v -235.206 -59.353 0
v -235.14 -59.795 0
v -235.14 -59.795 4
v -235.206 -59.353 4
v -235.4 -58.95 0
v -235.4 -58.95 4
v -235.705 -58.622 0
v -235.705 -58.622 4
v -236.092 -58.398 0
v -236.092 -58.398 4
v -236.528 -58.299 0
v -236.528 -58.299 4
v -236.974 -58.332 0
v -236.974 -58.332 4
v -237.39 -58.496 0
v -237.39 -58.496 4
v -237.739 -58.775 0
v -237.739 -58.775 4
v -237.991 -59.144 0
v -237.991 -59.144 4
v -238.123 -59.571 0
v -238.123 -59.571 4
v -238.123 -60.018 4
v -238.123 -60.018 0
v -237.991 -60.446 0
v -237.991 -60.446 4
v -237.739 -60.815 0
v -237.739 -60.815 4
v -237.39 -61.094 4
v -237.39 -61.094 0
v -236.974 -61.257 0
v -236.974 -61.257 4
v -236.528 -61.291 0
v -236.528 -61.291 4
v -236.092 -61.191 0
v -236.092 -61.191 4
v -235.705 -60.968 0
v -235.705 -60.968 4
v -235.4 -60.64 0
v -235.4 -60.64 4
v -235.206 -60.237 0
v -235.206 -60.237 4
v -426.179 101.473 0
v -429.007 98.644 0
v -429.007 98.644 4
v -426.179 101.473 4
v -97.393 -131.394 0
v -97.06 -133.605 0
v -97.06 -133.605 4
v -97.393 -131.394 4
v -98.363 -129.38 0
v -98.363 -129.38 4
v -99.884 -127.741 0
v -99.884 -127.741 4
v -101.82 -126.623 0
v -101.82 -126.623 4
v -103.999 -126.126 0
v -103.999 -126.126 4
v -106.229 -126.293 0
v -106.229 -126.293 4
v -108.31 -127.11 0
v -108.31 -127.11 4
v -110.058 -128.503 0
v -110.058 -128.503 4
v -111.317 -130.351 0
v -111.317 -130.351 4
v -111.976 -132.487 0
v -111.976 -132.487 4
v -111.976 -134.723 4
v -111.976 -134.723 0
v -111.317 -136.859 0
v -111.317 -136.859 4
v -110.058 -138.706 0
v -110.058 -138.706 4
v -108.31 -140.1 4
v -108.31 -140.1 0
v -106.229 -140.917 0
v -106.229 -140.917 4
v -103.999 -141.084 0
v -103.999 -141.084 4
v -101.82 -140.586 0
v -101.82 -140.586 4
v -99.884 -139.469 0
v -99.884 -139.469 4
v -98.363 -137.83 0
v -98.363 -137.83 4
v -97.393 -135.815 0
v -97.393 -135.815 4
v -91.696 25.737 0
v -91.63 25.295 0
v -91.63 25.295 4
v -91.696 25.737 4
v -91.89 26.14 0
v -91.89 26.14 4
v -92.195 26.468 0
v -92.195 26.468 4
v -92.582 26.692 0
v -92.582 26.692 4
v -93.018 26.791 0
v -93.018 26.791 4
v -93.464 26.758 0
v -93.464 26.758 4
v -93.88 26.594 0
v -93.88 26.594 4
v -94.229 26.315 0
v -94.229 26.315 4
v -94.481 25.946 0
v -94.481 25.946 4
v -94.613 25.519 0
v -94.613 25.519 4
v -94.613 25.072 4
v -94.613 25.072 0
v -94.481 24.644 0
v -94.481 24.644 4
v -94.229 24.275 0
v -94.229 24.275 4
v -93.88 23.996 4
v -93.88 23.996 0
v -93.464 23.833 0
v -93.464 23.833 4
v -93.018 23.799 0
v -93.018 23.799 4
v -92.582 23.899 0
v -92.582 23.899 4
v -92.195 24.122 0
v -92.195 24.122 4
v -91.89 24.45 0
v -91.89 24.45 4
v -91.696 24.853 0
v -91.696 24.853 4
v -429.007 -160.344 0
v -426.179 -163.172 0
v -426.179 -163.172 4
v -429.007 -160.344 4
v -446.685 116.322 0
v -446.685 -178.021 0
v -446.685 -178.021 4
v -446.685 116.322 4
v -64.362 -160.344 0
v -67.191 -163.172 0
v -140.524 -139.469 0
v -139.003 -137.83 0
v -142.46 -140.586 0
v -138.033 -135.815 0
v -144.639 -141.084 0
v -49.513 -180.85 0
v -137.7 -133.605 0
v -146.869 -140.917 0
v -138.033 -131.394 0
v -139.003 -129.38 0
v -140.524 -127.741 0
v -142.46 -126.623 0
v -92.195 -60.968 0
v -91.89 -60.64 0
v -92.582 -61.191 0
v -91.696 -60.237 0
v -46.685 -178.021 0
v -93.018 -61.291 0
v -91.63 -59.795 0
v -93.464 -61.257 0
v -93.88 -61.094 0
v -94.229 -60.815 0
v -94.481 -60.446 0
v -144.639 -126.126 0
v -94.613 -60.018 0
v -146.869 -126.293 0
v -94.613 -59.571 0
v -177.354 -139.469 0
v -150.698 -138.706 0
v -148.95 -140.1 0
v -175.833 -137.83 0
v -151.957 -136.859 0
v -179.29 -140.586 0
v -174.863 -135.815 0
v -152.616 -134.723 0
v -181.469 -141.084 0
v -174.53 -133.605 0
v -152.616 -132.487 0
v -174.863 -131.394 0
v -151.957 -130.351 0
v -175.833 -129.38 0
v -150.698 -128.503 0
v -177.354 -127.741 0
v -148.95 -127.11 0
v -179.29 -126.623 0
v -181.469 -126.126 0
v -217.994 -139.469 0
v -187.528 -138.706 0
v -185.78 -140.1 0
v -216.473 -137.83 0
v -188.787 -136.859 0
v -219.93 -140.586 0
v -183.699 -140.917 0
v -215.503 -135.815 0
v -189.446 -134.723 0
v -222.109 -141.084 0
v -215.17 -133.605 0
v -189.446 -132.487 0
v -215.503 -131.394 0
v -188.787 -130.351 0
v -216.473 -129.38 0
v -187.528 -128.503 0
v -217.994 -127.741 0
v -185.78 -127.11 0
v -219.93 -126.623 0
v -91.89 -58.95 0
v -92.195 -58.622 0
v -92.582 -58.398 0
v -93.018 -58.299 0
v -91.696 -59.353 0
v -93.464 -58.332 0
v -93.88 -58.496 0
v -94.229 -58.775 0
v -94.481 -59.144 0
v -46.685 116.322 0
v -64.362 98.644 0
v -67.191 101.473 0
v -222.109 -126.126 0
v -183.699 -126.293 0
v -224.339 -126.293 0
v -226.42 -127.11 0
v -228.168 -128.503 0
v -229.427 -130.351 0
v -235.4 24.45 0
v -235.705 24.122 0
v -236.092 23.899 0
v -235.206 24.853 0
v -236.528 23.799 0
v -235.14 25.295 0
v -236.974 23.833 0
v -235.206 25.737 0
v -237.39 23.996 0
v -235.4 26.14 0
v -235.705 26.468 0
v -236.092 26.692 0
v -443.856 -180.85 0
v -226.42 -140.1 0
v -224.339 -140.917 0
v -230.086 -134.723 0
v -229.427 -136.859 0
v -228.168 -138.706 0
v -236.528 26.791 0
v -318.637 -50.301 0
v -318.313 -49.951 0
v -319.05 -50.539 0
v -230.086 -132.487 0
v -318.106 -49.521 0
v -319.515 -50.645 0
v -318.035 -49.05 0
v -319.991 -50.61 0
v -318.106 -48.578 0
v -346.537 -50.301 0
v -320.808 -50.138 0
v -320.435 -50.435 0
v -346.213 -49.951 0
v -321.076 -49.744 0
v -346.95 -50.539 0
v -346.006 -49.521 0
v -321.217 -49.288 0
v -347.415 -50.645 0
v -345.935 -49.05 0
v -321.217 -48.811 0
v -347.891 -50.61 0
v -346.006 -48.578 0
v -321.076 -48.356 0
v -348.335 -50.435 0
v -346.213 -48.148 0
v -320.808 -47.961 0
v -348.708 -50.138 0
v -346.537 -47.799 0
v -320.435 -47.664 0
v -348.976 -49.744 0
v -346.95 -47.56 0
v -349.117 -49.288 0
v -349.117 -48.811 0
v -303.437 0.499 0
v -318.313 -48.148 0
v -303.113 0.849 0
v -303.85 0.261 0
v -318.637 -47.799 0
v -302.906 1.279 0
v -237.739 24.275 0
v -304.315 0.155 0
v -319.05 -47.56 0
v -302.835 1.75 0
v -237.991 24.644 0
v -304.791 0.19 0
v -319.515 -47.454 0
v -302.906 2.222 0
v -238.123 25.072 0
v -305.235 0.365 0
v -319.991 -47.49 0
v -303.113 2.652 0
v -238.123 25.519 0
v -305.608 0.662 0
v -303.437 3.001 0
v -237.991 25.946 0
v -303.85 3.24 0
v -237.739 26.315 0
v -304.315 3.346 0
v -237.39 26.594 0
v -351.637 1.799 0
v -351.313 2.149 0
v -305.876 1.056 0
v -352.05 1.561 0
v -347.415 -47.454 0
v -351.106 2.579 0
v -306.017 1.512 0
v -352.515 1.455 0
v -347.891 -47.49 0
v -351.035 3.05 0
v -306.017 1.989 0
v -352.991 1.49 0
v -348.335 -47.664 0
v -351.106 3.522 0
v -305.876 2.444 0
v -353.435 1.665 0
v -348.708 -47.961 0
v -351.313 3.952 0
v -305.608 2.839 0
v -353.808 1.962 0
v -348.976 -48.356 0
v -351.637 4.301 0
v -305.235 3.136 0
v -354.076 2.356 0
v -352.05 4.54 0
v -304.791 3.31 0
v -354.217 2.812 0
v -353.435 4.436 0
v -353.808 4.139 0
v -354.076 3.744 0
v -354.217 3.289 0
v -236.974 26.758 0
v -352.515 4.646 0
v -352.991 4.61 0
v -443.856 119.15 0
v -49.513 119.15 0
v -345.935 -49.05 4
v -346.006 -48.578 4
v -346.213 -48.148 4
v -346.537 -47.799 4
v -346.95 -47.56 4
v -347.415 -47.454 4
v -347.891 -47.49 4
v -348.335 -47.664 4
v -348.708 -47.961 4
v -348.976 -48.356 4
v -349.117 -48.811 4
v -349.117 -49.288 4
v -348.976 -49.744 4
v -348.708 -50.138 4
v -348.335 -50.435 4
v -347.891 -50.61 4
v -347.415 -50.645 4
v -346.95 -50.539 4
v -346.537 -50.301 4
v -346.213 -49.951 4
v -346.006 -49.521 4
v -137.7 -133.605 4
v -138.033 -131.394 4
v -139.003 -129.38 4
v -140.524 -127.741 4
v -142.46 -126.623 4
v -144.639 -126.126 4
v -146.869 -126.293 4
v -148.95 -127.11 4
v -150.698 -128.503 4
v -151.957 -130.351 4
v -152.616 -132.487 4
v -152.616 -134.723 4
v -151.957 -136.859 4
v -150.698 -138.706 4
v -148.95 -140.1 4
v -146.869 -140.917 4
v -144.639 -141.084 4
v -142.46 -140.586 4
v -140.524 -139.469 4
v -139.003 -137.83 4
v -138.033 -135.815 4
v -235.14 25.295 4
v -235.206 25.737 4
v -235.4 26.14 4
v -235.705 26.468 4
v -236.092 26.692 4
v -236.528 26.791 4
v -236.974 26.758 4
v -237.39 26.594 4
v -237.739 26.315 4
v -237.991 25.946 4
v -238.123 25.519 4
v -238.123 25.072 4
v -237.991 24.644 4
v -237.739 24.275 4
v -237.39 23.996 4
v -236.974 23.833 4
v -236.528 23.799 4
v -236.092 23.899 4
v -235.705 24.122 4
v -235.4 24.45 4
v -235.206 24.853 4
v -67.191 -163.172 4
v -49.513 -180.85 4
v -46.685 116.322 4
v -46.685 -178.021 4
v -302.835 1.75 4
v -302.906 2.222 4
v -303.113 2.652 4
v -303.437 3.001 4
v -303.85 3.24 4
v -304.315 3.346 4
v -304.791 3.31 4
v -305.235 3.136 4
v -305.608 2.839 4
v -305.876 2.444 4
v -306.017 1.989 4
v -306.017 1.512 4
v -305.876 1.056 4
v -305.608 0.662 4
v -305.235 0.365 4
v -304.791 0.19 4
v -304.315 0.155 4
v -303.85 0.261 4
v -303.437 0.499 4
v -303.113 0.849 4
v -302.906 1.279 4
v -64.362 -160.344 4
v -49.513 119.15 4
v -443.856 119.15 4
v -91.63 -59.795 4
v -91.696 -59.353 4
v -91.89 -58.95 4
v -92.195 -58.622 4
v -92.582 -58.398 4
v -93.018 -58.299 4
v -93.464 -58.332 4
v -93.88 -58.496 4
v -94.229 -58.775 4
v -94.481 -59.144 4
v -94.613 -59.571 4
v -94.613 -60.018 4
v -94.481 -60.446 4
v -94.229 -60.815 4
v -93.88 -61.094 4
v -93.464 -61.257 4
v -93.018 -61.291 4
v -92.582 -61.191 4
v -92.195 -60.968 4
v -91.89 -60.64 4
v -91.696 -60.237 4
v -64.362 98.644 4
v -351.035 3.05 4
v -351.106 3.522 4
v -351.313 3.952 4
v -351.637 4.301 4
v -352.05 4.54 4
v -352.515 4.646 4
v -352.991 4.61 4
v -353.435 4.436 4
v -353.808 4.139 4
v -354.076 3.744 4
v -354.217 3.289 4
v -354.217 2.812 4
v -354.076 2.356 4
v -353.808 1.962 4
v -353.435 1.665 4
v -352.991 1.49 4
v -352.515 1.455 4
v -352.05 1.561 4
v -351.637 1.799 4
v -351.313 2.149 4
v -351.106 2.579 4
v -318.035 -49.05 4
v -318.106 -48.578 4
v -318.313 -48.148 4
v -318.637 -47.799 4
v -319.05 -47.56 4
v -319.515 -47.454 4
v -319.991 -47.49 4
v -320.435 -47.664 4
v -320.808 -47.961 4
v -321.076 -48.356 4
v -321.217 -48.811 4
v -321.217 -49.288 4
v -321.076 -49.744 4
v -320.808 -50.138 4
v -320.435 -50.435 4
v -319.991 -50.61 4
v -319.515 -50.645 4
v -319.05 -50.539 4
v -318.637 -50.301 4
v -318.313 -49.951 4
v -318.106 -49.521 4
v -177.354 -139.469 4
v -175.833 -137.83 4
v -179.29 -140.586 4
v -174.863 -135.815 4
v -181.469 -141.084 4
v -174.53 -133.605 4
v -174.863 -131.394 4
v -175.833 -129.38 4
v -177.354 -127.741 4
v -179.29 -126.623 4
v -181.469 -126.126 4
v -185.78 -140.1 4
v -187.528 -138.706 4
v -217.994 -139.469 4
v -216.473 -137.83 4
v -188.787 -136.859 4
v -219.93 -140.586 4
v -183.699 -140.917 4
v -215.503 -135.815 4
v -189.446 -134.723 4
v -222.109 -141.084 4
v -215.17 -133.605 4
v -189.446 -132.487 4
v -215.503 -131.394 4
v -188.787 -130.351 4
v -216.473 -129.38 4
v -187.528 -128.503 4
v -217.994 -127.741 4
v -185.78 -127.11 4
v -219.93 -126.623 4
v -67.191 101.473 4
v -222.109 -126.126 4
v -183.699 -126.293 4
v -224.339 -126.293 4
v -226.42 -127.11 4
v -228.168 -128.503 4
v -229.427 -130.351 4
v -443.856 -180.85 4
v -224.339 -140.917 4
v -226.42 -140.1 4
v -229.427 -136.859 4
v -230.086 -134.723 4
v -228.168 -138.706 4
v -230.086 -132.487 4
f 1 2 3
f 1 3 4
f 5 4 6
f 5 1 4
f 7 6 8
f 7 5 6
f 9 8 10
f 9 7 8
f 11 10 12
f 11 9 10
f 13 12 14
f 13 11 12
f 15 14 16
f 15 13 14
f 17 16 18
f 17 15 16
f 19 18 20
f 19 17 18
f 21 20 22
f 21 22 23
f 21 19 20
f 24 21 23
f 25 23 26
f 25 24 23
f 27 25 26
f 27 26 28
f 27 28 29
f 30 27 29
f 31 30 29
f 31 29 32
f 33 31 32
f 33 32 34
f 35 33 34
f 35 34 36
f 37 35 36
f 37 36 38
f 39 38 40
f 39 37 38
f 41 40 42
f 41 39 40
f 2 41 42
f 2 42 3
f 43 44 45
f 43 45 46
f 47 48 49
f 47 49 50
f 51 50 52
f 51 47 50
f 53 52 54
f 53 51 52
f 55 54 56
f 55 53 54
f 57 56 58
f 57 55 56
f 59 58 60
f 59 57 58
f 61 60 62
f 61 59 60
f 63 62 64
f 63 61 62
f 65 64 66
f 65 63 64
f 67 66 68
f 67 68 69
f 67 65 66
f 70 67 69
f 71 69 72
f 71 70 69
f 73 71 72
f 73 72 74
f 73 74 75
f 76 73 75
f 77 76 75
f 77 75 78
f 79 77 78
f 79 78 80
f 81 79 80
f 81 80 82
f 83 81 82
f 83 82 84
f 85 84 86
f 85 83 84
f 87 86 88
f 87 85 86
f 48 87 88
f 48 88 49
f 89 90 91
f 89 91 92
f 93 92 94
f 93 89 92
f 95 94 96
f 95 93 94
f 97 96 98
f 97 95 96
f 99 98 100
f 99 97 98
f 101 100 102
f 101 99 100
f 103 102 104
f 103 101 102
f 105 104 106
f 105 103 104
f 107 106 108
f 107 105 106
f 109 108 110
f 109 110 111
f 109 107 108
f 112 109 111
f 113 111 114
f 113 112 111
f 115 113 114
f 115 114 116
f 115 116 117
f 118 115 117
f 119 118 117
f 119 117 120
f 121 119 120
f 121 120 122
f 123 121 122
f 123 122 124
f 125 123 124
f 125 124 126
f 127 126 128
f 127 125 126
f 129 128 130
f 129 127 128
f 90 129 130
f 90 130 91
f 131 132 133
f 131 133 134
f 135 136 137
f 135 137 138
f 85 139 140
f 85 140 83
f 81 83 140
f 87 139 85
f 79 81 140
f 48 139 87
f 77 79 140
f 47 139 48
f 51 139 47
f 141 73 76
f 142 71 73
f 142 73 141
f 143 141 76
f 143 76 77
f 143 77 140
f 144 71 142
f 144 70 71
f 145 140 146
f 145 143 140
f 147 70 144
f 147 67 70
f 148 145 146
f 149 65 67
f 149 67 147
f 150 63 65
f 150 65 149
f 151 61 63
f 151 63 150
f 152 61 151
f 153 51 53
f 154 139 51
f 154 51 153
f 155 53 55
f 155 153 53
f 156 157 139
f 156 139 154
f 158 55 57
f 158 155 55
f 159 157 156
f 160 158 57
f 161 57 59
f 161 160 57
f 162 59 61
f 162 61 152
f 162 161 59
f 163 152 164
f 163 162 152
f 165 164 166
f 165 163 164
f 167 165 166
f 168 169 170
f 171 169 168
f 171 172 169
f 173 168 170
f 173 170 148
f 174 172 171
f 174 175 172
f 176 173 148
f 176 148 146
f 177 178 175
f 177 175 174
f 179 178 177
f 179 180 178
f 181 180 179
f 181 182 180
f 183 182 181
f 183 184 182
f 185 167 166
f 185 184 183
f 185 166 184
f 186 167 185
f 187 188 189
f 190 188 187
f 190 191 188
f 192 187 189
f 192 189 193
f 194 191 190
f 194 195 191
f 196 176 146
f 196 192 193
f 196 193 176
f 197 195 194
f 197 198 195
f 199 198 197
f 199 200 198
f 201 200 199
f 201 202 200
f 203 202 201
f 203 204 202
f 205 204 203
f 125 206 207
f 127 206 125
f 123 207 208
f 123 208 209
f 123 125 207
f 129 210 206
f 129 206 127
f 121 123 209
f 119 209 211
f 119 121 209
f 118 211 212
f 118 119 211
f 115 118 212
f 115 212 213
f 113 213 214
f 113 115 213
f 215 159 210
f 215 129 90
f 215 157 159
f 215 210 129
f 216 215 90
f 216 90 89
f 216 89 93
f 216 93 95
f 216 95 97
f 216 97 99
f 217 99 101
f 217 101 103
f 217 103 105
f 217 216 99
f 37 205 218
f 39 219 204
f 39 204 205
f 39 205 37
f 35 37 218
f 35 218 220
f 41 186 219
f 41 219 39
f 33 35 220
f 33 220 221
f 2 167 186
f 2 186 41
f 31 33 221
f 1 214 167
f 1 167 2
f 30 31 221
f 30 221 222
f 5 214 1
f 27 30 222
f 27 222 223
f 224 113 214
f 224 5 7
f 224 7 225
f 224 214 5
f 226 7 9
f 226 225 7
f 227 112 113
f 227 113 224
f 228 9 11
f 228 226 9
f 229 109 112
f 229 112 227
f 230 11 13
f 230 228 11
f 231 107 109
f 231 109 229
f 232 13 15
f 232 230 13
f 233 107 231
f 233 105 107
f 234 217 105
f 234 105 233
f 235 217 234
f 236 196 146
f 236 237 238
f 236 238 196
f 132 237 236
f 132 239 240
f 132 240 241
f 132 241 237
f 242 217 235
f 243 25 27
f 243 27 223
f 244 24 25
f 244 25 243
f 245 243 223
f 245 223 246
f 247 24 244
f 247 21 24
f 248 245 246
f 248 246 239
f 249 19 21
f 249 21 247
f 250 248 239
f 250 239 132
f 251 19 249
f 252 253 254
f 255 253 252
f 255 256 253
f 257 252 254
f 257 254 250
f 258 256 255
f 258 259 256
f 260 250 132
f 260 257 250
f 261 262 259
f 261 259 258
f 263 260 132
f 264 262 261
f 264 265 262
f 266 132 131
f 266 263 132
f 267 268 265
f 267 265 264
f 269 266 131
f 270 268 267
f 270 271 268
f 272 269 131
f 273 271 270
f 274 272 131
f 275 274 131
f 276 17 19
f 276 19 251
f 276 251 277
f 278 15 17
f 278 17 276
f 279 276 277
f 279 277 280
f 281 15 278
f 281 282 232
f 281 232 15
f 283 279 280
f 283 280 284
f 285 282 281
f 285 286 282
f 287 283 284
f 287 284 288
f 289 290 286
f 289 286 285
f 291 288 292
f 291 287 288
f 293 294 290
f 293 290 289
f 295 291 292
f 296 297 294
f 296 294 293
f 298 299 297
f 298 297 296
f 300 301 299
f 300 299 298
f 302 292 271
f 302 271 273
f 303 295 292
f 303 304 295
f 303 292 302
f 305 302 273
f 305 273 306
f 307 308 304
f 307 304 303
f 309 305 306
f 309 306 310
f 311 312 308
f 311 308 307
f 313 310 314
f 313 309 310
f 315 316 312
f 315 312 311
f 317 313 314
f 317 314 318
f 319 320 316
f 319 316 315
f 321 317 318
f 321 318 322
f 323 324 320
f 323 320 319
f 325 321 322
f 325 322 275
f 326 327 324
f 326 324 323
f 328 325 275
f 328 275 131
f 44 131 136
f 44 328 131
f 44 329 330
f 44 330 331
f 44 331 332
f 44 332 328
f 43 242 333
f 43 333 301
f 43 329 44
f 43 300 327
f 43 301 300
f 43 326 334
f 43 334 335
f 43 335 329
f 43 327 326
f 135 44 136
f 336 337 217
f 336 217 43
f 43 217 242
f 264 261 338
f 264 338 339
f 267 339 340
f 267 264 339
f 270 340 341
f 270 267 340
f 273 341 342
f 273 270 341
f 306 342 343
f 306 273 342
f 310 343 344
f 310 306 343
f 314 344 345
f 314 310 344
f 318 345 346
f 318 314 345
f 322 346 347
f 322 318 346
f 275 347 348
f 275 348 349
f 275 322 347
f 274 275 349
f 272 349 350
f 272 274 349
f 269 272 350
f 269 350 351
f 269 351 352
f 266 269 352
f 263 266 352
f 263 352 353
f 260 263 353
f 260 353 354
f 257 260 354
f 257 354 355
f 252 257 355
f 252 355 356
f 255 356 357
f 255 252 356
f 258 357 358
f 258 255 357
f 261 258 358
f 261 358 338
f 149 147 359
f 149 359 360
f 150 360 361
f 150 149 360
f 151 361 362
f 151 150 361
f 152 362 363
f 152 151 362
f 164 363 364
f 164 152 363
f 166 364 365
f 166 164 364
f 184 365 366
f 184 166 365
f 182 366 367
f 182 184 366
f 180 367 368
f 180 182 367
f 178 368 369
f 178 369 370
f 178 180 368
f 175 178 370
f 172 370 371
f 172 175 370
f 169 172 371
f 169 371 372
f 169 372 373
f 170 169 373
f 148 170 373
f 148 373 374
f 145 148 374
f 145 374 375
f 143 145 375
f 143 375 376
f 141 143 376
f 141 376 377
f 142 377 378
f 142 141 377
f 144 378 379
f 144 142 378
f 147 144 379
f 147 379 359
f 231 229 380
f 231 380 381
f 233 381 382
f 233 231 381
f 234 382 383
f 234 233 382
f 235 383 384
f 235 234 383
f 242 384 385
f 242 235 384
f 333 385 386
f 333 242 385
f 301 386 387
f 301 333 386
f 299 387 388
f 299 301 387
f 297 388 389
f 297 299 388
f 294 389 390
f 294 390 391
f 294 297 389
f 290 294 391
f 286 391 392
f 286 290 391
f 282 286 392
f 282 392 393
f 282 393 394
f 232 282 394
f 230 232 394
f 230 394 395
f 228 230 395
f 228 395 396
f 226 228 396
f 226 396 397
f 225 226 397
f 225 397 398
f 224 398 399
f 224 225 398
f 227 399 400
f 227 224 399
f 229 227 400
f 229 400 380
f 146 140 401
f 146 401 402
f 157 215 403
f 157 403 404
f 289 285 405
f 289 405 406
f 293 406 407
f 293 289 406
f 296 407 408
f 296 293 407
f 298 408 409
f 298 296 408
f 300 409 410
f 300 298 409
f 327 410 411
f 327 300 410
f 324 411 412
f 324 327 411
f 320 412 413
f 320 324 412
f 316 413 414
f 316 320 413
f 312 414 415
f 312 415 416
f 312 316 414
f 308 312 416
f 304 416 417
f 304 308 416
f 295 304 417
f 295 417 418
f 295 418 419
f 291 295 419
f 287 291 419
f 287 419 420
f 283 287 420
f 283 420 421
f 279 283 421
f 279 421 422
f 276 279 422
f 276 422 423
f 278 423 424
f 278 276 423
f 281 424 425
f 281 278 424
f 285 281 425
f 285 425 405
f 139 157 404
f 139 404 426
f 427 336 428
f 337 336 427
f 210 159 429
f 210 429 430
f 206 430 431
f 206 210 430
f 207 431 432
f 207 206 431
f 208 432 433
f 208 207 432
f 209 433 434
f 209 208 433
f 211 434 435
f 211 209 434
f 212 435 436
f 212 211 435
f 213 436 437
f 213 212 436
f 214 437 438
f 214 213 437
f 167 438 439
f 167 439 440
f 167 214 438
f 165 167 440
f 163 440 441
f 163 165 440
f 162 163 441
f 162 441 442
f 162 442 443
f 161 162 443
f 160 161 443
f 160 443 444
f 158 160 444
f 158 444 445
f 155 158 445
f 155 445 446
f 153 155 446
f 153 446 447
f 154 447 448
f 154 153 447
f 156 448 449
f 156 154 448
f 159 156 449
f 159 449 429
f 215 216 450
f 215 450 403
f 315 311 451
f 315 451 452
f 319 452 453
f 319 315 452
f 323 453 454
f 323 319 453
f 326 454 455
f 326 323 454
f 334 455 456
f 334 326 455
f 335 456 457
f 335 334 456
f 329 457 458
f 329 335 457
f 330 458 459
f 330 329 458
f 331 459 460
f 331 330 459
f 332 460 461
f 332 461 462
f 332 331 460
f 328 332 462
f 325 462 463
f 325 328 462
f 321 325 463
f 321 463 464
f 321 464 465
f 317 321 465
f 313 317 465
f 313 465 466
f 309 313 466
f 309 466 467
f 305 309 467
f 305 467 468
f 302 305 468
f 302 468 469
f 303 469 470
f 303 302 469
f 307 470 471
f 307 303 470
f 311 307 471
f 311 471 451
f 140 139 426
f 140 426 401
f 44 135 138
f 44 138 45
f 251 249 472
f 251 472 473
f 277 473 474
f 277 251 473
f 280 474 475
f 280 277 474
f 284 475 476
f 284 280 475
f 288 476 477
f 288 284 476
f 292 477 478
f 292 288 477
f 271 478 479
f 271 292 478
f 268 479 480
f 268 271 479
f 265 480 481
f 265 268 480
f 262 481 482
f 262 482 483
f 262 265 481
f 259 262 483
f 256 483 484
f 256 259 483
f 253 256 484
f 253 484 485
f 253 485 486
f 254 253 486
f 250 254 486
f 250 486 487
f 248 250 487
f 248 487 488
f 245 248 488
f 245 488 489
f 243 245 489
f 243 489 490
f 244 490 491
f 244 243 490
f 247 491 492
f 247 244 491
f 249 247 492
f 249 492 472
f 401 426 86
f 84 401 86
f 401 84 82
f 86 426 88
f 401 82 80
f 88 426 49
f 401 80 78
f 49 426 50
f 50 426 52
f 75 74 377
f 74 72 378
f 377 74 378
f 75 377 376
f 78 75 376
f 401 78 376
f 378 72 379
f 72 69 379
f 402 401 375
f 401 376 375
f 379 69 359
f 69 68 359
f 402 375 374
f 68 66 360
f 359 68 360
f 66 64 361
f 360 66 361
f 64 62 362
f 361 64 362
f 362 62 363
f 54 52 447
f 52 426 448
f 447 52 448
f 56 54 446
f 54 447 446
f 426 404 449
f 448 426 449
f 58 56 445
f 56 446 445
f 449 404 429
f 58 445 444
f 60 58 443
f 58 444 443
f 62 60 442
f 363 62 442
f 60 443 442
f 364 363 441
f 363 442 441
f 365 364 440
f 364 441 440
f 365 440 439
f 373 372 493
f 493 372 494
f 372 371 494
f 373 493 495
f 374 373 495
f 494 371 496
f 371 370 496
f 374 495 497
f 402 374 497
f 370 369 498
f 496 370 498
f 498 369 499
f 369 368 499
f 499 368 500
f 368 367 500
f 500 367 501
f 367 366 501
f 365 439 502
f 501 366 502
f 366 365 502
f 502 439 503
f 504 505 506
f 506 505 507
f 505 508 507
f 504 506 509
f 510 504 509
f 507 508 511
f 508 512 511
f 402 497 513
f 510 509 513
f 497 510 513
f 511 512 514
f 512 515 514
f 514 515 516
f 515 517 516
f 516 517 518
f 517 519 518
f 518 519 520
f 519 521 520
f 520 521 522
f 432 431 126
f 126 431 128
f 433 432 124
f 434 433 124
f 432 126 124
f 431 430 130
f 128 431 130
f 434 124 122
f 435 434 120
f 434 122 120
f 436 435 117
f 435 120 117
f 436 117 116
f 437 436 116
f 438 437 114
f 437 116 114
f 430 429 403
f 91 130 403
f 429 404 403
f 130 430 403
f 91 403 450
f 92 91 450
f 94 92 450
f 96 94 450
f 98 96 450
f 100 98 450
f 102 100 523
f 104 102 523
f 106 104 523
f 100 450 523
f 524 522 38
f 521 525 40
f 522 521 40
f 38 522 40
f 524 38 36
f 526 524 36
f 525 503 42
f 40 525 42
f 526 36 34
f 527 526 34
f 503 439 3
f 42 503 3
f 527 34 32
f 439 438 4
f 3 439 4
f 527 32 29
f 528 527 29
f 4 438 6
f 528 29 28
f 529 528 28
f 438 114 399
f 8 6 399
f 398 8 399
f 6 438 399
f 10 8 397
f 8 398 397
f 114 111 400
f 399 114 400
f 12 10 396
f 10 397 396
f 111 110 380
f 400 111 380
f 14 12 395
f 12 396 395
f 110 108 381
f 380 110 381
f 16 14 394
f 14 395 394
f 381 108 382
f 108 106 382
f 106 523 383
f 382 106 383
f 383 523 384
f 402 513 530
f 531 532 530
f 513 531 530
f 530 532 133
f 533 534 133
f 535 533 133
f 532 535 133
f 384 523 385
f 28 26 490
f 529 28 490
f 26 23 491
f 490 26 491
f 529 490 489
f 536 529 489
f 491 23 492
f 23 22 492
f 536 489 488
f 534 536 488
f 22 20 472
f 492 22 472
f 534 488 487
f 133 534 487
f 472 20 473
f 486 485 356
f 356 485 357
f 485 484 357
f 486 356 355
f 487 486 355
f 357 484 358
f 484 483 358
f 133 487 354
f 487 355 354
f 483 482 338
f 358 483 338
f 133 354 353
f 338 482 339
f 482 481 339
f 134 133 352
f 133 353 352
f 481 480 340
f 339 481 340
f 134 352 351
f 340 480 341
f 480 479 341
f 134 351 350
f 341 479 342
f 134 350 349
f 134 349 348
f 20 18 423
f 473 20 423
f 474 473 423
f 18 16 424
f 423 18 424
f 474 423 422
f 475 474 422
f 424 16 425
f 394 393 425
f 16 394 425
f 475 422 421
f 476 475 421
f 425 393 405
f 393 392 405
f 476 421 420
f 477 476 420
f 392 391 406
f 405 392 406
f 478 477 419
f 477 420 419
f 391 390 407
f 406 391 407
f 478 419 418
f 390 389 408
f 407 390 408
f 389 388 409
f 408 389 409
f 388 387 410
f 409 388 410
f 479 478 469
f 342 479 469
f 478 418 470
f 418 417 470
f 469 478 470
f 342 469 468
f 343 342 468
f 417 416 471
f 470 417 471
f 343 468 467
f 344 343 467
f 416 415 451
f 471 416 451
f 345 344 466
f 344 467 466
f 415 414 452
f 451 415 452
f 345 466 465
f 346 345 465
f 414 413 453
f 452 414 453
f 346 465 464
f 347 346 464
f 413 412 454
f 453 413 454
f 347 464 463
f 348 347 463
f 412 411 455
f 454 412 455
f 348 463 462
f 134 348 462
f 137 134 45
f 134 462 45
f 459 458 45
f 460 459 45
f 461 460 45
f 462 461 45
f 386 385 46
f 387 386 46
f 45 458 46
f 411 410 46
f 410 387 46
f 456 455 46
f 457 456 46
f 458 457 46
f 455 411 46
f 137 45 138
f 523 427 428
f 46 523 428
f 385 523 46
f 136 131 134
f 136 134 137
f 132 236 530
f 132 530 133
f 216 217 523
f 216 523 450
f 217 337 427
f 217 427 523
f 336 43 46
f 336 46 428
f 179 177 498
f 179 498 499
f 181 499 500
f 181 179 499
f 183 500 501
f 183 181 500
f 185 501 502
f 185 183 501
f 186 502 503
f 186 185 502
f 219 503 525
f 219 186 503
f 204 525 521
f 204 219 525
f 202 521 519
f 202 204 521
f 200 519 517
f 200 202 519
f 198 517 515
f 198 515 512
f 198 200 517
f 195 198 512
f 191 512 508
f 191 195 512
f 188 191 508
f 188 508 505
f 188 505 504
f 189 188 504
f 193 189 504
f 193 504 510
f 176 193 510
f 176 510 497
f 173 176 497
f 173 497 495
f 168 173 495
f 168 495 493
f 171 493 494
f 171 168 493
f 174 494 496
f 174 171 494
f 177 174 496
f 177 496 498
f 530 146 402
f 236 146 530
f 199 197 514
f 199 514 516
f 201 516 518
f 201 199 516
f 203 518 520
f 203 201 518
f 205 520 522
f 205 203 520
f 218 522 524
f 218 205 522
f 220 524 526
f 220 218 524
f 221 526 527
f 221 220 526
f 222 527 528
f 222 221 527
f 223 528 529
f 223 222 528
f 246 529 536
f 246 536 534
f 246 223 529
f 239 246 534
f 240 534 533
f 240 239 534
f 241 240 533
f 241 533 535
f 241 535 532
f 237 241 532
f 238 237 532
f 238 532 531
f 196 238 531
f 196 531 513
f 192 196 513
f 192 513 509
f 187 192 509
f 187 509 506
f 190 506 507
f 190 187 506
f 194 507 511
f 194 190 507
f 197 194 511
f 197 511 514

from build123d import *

# Parameters (mm, degrees)
ESQUISSE1_R        = 1.5
ESQUISSE1_R_2      = 7.5
ESQUISSE1_R_3      = 1.6
BOSS_EXTRU_1_DEPTH = 4


with BuildPart() as part:
    # Esquisse1 → Boss.-Extru.1 (new body)
    with BuildSketch(Plane.XY):
        Polygon((-443.856361675, 119.15022686), (-49.513215925, 119.15022686), (-67.190885454, 101.472557331), (-64.36245833, 98.644130206), (-46.6847888, 116.321799736), (-46.6847888, -178.021346015), (-64.36245833, -160.343676485), (-67.190885454, -163.17210361), (-49.513215925, -180.84977314), (-443.856361675, -180.84977314), (-426.178692146, -163.17210361), (-429.00711927, -160.343676485), (-446.6847888, -178.021346015), (-446.6847888, 116.321799736), (-429.00711927, 98.644130206), (-426.178692146, 101.472557331), align=None)
        with Locations((-236.6397888, 25.29522686)):
            Circle(ESQUISSE1_R, mode=Mode.SUBTRACT)
        with Locations((-93.1297888, 25.29522686)):
            Circle(ESQUISSE1_R, mode=Mode.SUBTRACT)
        with Locations((-236.6397888, -59.79477314)):
            Circle(ESQUISSE1_R, mode=Mode.SUBTRACT)
        with Locations((-93.1297888, -59.79477314)):
            Circle(ESQUISSE1_R, mode=Mode.SUBTRACT)
        with Locations((-104.5597888, -133.60477314)):
            Circle(ESQUISSE1_R_2, mode=Mode.SUBTRACT)
        with Locations((-347.5347888, -49.04977314)):
            Circle(ESQUISSE1_R_3, mode=Mode.SUBTRACT)
        with Locations((-319.6347888, -49.04977314)):
            Circle(ESQUISSE1_R_3, mode=Mode.SUBTRACT)
        with Locations((-352.6347888, 3.05022686)):
            Circle(ESQUISSE1_R_3, mode=Mode.SUBTRACT)
        with Locations((-304.4347888, 1.75022686)):
            Circle(ESQUISSE1_R_3, mode=Mode.SUBTRACT)
        with Locations((-145.1997888, -133.60477314)):
            Circle(ESQUISSE1_R_2, mode=Mode.SUBTRACT)
        with Locations((-182.0297888, -133.60477314)):
            Circle(ESQUISSE1_R_2, mode=Mode.SUBTRACT)
        with Locations((-222.6697888, -133.60477314)):
            Circle(ESQUISSE1_R_2, mode=Mode.SUBTRACT)
    extrude(amount=BOSS_EXTRU_1_DEPTH)


solid = part.part
